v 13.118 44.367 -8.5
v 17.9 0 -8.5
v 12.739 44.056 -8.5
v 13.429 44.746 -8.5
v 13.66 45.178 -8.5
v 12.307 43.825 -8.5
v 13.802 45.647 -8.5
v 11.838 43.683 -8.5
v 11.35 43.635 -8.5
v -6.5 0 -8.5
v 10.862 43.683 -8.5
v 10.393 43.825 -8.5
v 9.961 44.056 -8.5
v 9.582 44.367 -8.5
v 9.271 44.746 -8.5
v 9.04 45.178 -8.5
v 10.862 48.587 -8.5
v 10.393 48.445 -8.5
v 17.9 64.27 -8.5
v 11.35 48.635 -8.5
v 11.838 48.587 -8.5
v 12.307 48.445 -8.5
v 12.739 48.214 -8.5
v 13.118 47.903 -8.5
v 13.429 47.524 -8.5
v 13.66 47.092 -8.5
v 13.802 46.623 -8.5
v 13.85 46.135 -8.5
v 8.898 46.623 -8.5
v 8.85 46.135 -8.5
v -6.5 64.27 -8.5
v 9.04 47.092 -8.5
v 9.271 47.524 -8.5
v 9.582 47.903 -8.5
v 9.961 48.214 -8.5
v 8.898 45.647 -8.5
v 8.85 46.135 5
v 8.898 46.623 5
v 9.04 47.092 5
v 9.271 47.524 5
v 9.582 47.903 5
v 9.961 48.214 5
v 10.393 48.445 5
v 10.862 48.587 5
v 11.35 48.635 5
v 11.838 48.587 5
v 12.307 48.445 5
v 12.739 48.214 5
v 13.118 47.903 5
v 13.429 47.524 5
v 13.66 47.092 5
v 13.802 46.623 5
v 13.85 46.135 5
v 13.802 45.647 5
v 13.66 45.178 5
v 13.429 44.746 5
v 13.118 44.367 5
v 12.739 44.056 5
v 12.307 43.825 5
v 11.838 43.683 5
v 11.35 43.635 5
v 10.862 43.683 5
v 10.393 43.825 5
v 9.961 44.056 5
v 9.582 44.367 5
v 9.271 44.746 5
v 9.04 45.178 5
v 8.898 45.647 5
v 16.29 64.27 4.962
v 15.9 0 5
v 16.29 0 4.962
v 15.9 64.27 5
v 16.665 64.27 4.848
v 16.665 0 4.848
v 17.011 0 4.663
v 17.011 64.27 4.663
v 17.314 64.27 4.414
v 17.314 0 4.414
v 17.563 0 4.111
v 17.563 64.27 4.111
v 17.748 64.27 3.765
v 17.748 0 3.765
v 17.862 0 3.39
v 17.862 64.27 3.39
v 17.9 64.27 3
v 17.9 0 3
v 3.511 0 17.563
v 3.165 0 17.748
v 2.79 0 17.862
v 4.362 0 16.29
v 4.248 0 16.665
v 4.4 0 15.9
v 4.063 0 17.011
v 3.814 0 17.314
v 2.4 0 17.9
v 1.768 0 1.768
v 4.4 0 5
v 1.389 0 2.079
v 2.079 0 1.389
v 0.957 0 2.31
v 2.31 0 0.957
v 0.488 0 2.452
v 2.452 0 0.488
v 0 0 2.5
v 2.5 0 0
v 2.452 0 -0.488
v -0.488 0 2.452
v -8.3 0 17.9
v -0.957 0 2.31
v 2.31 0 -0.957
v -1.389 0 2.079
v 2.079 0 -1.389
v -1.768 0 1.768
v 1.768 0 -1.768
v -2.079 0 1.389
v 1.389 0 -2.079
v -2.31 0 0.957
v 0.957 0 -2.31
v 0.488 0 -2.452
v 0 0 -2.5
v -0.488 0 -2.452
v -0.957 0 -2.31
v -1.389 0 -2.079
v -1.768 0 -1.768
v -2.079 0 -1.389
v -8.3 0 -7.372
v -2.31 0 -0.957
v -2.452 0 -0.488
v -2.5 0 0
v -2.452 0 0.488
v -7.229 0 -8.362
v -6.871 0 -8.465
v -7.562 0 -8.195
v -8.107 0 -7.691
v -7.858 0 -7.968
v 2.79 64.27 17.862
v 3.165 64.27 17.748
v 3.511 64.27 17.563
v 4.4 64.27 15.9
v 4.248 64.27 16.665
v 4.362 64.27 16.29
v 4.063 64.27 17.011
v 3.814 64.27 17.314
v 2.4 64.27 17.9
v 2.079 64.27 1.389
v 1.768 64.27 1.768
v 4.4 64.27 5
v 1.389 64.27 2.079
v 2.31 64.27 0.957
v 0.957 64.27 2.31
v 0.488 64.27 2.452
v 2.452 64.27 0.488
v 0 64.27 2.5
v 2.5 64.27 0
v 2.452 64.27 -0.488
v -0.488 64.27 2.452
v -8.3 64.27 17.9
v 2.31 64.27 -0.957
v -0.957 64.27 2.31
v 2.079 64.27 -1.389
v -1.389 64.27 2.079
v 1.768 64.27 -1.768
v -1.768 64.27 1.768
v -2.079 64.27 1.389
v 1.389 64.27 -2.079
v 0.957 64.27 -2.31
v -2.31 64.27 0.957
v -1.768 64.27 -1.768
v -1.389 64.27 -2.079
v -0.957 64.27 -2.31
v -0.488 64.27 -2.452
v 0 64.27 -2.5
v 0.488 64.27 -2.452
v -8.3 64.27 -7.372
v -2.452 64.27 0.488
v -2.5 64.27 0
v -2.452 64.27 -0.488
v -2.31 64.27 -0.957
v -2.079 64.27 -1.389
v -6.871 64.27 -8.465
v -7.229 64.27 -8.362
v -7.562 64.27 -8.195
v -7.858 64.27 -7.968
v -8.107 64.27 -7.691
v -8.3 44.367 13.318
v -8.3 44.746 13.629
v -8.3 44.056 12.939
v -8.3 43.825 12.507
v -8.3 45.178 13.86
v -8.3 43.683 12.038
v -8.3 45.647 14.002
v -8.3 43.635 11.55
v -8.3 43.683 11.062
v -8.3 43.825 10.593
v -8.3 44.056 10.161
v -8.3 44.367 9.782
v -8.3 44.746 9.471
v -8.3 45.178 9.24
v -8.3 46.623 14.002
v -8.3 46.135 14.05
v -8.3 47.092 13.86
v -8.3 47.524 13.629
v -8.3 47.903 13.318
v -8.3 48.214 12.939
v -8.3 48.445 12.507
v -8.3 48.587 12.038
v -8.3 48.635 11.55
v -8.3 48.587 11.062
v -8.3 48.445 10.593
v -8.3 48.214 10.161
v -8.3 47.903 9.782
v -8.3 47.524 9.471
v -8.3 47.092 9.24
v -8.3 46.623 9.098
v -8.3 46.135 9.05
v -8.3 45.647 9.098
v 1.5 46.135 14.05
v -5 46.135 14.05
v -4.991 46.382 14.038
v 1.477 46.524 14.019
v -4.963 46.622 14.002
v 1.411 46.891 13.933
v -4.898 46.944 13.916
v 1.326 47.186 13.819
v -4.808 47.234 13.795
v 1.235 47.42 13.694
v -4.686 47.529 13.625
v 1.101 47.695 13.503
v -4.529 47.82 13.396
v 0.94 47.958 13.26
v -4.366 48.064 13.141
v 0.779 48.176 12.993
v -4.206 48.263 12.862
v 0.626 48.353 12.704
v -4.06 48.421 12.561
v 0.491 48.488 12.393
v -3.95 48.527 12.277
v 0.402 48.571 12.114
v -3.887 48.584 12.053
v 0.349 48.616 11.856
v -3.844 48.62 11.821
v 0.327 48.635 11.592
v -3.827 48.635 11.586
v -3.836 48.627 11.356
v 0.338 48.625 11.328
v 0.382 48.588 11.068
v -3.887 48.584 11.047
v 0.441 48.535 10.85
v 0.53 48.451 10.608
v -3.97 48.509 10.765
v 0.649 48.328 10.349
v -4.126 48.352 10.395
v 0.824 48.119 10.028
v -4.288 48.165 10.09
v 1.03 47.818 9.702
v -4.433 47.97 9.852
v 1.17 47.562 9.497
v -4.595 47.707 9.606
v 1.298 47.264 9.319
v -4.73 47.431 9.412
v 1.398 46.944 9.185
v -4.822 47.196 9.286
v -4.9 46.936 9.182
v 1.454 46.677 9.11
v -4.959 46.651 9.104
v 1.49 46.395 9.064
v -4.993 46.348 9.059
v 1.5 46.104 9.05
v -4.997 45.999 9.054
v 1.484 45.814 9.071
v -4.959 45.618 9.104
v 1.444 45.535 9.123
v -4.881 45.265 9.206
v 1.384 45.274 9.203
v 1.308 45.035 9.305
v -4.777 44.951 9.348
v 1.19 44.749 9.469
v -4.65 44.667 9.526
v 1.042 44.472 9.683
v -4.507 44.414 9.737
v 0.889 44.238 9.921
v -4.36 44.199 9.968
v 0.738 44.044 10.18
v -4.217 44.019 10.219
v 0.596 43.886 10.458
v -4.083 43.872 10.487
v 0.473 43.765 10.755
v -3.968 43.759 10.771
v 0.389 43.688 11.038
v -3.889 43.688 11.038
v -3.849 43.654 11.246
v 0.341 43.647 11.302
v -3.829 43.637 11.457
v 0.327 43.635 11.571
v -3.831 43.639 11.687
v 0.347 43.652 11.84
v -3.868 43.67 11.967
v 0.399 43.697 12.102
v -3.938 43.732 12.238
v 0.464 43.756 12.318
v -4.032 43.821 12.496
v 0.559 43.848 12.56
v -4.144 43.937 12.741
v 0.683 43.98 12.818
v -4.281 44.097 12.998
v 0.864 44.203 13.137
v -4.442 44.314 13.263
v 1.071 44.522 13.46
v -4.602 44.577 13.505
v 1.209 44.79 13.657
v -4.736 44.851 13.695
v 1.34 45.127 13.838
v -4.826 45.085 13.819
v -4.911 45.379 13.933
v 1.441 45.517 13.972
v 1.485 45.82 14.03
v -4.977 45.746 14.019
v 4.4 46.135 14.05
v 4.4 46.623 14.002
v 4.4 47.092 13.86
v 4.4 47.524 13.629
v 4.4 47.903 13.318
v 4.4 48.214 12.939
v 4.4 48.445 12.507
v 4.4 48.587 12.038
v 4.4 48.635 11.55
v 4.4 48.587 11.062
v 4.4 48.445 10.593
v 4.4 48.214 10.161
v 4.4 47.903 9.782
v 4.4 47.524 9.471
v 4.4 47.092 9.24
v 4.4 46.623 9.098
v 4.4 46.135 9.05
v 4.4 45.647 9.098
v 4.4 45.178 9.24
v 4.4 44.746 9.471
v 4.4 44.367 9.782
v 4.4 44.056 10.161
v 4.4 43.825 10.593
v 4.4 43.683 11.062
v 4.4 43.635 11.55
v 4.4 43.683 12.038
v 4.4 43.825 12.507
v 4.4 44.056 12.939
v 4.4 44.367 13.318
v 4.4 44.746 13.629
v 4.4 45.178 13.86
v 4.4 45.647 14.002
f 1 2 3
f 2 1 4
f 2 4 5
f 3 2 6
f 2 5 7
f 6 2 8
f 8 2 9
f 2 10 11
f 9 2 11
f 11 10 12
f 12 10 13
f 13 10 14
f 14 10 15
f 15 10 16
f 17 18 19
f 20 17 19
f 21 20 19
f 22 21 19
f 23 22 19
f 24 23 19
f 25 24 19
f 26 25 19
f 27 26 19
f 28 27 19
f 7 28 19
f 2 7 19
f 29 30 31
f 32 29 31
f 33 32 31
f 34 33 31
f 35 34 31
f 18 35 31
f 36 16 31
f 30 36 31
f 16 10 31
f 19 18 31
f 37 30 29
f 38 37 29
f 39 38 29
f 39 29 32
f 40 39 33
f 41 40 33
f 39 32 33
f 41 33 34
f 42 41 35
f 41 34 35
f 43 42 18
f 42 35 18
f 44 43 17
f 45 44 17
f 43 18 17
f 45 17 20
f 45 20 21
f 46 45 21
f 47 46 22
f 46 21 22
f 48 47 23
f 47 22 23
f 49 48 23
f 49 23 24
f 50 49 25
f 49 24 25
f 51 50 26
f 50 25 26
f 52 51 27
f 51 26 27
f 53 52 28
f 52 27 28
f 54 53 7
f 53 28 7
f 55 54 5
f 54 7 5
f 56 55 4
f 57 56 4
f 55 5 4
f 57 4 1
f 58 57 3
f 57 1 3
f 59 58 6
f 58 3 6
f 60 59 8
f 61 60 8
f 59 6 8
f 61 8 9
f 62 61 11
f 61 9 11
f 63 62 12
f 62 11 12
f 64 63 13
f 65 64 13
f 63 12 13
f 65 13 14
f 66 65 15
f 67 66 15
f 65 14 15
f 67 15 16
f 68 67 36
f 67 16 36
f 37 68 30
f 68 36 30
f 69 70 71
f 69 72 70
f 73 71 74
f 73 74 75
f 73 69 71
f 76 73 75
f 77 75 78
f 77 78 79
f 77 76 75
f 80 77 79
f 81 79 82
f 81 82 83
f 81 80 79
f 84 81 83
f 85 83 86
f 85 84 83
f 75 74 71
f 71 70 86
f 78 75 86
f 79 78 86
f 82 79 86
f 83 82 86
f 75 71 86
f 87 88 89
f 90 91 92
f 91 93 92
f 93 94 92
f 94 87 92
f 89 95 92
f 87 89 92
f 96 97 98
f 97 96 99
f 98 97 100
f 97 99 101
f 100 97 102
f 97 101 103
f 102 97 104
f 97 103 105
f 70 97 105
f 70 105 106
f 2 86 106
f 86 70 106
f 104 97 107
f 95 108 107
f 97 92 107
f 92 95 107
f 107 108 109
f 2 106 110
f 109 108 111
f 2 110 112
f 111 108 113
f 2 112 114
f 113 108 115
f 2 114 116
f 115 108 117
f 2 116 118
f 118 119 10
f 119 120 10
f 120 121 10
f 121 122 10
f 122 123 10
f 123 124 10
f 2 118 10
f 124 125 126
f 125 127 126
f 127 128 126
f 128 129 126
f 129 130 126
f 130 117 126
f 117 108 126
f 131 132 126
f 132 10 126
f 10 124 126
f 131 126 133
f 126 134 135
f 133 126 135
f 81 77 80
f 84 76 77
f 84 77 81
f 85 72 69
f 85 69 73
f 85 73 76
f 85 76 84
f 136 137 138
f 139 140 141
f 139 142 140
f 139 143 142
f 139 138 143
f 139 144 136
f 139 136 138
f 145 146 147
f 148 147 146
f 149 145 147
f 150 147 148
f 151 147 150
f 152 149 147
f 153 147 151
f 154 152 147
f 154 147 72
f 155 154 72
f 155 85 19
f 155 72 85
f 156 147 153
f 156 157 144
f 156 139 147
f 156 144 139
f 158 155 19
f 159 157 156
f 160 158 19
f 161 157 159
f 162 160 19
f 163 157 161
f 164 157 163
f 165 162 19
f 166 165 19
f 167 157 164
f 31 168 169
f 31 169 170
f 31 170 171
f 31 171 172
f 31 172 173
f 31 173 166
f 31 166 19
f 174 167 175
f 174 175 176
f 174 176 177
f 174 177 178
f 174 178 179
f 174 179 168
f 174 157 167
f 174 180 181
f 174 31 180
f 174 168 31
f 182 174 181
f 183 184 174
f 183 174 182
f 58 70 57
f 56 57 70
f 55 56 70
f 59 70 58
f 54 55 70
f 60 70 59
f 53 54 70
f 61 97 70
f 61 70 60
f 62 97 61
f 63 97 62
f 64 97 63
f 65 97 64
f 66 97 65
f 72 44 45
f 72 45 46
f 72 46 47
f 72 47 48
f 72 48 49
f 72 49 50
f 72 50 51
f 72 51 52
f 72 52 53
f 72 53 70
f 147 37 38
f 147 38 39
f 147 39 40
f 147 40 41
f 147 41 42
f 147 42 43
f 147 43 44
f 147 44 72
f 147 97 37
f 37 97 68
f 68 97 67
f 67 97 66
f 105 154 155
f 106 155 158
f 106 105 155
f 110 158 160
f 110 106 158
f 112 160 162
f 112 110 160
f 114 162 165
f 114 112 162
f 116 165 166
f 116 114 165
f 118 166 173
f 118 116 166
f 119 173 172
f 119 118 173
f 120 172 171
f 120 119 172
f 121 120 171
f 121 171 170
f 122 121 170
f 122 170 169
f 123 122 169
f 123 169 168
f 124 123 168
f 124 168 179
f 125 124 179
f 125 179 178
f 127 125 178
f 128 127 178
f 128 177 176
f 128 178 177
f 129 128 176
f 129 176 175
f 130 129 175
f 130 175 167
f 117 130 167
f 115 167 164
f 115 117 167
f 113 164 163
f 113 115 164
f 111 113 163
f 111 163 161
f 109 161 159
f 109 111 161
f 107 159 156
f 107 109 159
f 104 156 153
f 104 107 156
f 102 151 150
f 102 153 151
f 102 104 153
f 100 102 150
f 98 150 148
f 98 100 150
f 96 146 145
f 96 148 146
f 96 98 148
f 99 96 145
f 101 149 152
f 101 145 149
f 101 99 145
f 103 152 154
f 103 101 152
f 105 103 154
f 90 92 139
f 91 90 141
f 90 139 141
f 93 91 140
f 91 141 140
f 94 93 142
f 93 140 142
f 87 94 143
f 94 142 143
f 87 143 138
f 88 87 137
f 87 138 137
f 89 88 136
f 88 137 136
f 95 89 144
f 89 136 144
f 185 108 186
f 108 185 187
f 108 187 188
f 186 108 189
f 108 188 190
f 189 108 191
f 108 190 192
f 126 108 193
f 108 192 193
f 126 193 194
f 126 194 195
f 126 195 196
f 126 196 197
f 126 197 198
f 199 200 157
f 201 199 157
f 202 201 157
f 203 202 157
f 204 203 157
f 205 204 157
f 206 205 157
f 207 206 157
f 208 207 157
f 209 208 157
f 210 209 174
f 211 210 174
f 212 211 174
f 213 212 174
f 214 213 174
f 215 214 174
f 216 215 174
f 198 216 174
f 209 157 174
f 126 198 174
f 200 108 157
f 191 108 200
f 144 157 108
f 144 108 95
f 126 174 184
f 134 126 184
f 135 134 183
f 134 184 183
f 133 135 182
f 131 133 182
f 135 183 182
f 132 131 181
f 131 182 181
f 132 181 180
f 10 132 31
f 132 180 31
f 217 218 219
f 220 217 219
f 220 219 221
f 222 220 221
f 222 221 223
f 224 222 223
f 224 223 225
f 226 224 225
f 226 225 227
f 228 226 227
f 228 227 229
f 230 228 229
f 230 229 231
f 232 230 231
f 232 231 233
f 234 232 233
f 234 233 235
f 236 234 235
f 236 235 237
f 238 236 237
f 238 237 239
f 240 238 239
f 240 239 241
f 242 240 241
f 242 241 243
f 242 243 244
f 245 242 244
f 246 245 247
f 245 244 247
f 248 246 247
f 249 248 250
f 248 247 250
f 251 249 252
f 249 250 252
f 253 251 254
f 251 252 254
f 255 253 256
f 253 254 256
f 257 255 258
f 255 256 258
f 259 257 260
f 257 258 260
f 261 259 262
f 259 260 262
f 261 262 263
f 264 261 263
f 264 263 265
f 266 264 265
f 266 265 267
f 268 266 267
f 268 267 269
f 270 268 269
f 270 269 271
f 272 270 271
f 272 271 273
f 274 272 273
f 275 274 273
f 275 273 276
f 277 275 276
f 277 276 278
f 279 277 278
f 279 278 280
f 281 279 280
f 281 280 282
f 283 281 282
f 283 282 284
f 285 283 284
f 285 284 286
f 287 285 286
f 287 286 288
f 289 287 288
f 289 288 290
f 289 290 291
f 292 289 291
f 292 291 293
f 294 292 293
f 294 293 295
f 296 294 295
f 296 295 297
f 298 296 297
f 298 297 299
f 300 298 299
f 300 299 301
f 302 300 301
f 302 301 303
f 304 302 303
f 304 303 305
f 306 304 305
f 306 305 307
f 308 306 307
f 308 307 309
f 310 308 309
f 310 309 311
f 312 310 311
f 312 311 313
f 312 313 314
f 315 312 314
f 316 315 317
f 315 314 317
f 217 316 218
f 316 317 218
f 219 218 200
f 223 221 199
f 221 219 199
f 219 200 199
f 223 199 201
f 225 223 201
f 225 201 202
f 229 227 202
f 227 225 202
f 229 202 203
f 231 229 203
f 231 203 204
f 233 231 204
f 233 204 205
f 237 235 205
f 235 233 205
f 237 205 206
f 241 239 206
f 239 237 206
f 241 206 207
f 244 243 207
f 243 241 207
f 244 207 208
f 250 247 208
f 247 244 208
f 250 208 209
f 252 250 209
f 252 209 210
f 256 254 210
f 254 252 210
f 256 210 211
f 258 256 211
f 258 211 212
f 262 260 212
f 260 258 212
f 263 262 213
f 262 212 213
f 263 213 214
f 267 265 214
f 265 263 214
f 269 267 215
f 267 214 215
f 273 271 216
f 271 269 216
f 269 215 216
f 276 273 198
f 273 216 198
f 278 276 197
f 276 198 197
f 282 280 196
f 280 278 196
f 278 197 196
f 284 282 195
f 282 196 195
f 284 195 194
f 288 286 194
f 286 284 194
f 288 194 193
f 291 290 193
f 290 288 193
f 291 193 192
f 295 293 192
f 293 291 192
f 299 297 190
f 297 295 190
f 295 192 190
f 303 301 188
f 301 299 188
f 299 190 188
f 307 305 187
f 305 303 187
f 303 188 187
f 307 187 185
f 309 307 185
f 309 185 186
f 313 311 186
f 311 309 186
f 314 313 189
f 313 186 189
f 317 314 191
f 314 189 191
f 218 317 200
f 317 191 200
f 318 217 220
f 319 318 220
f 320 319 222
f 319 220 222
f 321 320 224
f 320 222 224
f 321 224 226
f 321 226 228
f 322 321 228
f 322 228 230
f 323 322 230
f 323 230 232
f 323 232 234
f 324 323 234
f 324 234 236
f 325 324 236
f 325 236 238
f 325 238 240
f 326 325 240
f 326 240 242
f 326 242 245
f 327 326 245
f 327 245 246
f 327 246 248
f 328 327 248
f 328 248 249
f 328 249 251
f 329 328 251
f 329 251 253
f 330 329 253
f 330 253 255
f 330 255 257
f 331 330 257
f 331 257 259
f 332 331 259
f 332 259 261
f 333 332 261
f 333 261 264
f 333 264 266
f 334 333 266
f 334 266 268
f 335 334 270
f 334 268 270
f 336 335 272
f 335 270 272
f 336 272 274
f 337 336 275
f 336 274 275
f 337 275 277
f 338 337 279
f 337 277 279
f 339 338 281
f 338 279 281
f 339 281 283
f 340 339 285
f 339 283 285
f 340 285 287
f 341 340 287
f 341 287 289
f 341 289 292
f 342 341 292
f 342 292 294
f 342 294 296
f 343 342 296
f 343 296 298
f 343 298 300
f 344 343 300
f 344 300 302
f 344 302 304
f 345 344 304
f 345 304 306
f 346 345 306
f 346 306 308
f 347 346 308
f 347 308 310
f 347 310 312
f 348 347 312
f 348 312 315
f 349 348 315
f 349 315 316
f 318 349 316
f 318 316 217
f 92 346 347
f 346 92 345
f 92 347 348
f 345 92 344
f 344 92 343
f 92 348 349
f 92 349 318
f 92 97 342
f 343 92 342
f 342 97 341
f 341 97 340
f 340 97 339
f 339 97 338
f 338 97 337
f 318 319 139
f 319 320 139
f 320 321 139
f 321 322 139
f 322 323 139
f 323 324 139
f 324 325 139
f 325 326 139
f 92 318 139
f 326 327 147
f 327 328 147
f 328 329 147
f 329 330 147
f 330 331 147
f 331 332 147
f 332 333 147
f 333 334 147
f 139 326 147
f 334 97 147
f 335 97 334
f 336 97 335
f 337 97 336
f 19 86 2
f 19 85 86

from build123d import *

# Parameters (mm, degrees)
HOLE_TOPMAIN_OUTLINE_W = 12.9
HOLE_TOPMAIN_OUTLINE_H = 12.9
HOLE_TOPMAIN_OUTLINE_R = 2.5
HOLE_TOPMAIN_DEPTH     = 64.27
SKETCH14_R             = 2.5
CUT_EXTRUDE9_DEPTH     = 67.100627077
SKETCH15_R             = 3.25
CUT_EXTRUDE10_DEPTH    = 66.309210028
SKETCH18_W             = 12.9
SKETCH18_H             = 64.27
SKETCH18_R             = 3.25
BOSS_EXTRUDE2_DEPTH    = 13.5
FILLET3_R              = 2
SKETCH19_R             = 2.5
CUT_EXTRUDE11_DEPTH    = 13.5
SKETCH22_W             = 13.5
SKETCH22_H             = 64.27
BOSS_EXTRUDE3_DEPTH    = 13.5
BOSS_EXTRUDE5_START    = -26.4
SKETCH24_R             = 3.25
BOSS_EXTRUDE5_DEPTH    = 26.4
CUT_EXTRUDE12_START    = -64.27
SKETCH25_R             = 2.5
CUT_EXTRUDE12_DEPTH    = 64.27
SKETCH26_R             = 2.5
CUT_EXTRUDE13_DEPTH    = 13.5
SKETCH28_R             = 2.5
CUT_EXTRUDE14_DEPTH    = 13.5
FILLET4_R              = 2
SKETCH29_W             = 0.2
SKETCH29_H             = 25.271779789
CUT_EXTRUDE15_DEPTH    = 64.27


# Read off the part's stored shape, not the designer's step: hole-TopMain
with BuildPart() as part:
    # hole-TopMain outline → hole-TopMain (new body)
    with BuildSketch(Plane(origin=(0, 0, 0), x_dir=(1, 0, 0), z_dir=(0, 1, 0))):
        with Locations((-2.05, 2.05)):
            Rectangle(HOLE_TOPMAIN_OUTLINE_W, HOLE_TOPMAIN_OUTLINE_H)
        Circle(HOLE_TOPMAIN_OUTLINE_R, mode=Mode.SUBTRACT)
    extrude(amount=HOLE_TOPMAIN_DEPTH)

    # Sketch14 → Cut-Extrude9 (cut, through all)
    with BuildSketch(Plane(origin=(0, 0, -8.5), x_dir=(-1, 0, 0), z_dir=(0, 0, -1))):
        with Locations((1.75, 46.135)):
            Circle(SKETCH14_R)
    extrude(amount=-CUT_EXTRUDE9_DEPTH, mode=Mode.SUBTRACT)

    # Sketch15 → Cut-Extrude10 (cut, through all)
    with BuildSketch(Plane(origin=(0, 0, -3.5), x_dir=(-1, 0, 0), z_dir=(0, 0, -1))):
        with Locations((1.75, 46.135)):
            Circle(SKETCH15_R)
    extrude(amount=-CUT_EXTRUDE10_DEPTH, mode=Mode.SUBTRACT)

    # Sketch18 → Boss-Extrude2 (add)
    with BuildSketch(Plane.XY.offset(4.4)):
        with Locations((-2.05, 32.135)):
            Rectangle(SKETCH18_W, SKETCH18_H)
        with Locations(Location((-1.75, 46.135, 0), (0, 0, 180))):
            Circle(SKETCH18_R, mode=Mode.SUBTRACT)
    extrude(amount=BOSS_EXTRUDE2_DEPTH)

    # Fillet3
    fillet3_edges = [part.edges().sort_by_distance(p)[0] for p in [
        (-8.5, 32.135, -8.5),
        (4.4, 32.135, 17.9),
    ]]
    fillet(fillet3_edges, radius=FILLET3_R)

    # Sketch19 → Cut-Extrude11 (cut)
    with BuildSketch(Plane.ZY.offset(8.5)):
        with Locations((11.55, 46.135)):
            Circle(SKETCH19_R)
    extrude(amount=-CUT_EXTRUDE11_DEPTH, mode=Mode.SUBTRACT)

    # Sketch22 → Boss-Extrude3 (add)
    with BuildSketch(Plane(origin=(4.4, 0, 0), x_dir=(0, 0, -1), z_dir=(1, 0, 0))):
        with Locations((1.75, 32.135)):
            Rectangle(SKETCH22_W, SKETCH22_H)
    extrude(amount=BOSS_EXTRUDE3_DEPTH)

    # Sketch24 → Boss-Extrude5 (add)
    with BuildSketch(Plane.XY.offset(17.9).offset(BOSS_EXTRUDE5_START)):
        with Locations((-1.75, 46.135)):
            Circle(SKETCH24_R)
    extrude(amount=BOSS_EXTRUDE5_DEPTH)

    # Sketch25 → Cut-Extrude12 (cut)
    with BuildSketch(Plane(origin=(0, 64.27, 0), x_dir=(1, 0, 0), z_dir=(0, 1, 0)).offset(CUT_EXTRUDE12_START)):
        with Locations(Location((0, 0, 0), (0, 0, 90))):
            Circle(SKETCH25_R)
    extrude(amount=CUT_EXTRUDE12_DEPTH, mode=Mode.SUBTRACT)

    # Sketch26 → Cut-Extrude13 (cut)
    with BuildSketch(Plane.ZY.offset(8.5)):
        with Locations((11.55, 46.135)):
            Circle(SKETCH26_R)
    extrude(amount=-CUT_EXTRUDE13_DEPTH, mode=Mode.SUBTRACT)

    # Sketch28 → Cut-Extrude14 (cut)
    with BuildSketch(Plane(origin=(0, 0, -8.5), x_dir=(-1, 0, 0), z_dir=(0, 0, -1))):
        with Locations((-11.35, 46.135)):
            Circle(SKETCH28_R)
    extrude(amount=-CUT_EXTRUDE14_DEPTH, mode=Mode.SUBTRACT)

    # Fillet4
    fillet4_edges = [part.edges().sort_by_distance(p)[0] for p in [
        (17.9, 32.135, 5),
    ]]
    fillet(fillet4_edges, radius=FILLET4_R)

    # Sketch29 → Cut-Extrude15 (cut)
    with BuildSketch(Plane(origin=(0, 64.27, 0), x_dir=(1, 0, 0), z_dir=(0, 1, 0))):
        with Locations((-8.4, -5.264110106)):
            Rectangle(SKETCH29_W, SKETCH29_H)
    extrude(amount=-CUT_EXTRUDE15_DEPTH, mode=Mode.SUBTRACT)


solid = part.part
